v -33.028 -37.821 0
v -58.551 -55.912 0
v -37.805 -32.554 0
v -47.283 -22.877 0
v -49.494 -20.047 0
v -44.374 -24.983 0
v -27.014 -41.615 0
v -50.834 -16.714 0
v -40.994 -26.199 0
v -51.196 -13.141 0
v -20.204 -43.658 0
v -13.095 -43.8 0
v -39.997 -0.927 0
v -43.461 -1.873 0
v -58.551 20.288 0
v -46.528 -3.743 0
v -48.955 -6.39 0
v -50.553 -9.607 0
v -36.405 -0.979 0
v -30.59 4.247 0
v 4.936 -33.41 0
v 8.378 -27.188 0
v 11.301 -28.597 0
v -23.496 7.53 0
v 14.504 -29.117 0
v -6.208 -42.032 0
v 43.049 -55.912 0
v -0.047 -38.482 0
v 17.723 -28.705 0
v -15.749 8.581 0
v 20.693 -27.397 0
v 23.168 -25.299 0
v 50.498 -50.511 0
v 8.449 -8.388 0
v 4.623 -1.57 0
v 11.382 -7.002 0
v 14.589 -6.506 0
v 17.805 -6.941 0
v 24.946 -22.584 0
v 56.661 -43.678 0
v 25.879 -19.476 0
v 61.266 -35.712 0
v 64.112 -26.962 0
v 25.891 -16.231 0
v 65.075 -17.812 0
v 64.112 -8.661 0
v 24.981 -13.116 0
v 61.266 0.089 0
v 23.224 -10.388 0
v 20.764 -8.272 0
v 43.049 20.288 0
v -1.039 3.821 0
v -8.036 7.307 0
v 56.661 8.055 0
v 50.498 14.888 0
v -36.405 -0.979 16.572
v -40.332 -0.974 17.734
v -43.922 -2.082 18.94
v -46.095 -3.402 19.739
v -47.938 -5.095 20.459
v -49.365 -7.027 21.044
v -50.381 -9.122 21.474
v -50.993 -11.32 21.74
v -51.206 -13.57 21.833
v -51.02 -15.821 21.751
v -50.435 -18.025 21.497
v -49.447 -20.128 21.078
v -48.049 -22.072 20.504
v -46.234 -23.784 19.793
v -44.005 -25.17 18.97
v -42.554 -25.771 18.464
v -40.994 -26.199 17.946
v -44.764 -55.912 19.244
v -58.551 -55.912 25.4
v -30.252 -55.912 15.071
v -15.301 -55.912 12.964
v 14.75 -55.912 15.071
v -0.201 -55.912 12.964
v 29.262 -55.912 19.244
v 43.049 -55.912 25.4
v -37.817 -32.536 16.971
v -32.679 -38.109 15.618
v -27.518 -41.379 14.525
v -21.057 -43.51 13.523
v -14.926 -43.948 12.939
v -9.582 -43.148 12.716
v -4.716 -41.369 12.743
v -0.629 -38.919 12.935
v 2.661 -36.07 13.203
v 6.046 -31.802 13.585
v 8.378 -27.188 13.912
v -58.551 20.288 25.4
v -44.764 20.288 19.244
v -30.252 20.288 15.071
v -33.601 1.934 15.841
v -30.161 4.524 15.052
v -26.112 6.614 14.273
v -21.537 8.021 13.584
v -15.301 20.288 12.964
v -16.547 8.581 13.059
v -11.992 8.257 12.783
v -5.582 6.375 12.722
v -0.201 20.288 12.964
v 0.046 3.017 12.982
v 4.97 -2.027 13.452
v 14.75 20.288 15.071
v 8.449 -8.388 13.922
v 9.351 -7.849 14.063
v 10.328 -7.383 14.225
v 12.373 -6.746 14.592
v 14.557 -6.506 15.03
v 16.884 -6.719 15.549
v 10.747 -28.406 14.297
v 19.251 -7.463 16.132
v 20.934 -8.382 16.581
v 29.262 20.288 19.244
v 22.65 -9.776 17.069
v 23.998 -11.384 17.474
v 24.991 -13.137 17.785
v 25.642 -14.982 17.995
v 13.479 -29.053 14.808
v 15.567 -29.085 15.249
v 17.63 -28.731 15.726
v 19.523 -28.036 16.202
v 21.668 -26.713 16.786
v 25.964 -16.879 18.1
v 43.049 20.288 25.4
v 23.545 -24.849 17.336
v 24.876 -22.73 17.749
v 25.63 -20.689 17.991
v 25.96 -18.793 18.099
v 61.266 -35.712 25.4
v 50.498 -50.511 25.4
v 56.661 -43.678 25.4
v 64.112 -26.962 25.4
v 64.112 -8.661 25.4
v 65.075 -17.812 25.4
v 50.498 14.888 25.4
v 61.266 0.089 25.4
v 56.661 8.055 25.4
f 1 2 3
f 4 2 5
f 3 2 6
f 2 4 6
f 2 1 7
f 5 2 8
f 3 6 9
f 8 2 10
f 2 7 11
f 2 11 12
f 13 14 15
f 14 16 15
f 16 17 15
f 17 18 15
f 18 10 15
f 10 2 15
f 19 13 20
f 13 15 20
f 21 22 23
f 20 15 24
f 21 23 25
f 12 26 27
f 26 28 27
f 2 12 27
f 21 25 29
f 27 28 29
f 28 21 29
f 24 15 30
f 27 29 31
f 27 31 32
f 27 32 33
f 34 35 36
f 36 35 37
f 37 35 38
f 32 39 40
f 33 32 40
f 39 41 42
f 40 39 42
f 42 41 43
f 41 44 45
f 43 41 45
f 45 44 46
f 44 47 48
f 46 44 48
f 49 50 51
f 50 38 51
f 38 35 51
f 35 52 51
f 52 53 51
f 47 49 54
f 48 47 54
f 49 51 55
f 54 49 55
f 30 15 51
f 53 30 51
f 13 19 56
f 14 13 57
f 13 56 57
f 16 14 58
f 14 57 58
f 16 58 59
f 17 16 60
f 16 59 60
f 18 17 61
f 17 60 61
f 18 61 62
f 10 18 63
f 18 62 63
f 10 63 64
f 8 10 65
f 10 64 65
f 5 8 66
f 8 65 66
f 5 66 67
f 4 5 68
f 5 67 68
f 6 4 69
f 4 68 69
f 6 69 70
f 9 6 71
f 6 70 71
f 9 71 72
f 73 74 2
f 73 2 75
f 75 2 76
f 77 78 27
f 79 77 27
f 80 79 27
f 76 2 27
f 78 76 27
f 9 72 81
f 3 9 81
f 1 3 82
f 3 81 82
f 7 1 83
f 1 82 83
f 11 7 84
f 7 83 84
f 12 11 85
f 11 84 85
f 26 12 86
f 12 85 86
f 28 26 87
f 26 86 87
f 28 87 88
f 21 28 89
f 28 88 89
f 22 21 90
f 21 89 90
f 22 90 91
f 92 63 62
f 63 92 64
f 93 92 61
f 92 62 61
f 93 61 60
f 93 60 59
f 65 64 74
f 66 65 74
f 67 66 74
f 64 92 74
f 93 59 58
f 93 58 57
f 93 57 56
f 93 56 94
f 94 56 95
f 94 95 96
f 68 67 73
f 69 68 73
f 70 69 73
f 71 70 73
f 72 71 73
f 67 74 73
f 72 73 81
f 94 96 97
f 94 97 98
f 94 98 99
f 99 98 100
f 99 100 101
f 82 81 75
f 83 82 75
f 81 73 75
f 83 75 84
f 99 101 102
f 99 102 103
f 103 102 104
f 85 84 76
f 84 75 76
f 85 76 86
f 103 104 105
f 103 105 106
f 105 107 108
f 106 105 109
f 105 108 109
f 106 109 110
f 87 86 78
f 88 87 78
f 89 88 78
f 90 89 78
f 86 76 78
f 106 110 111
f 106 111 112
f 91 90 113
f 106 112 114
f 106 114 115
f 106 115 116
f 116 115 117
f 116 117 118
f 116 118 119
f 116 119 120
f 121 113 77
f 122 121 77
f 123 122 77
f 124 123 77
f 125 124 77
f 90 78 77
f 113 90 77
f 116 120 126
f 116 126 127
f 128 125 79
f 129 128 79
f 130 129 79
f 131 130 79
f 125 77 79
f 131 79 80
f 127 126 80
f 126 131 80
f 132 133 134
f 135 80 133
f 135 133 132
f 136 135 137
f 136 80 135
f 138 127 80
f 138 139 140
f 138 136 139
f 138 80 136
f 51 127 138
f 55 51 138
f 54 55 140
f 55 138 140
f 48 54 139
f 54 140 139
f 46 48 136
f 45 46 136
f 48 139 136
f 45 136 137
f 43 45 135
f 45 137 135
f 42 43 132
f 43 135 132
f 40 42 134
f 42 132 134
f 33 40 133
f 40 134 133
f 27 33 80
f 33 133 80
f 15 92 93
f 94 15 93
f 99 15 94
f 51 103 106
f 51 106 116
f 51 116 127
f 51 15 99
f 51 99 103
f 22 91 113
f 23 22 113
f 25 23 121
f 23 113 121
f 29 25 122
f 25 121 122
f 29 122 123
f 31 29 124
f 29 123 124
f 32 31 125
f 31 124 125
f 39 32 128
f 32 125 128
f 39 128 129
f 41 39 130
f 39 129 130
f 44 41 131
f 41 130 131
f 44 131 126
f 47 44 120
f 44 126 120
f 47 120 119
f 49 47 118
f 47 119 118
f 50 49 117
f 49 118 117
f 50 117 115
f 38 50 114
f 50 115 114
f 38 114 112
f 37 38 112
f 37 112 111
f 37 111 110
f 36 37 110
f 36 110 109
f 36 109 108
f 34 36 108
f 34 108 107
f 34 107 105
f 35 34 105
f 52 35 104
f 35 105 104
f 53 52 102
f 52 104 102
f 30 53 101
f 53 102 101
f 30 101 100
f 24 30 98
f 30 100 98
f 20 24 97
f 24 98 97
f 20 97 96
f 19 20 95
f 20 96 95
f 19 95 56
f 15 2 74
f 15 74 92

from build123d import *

# Parameters (mm, degrees)
F0_W     = 127
F0_H     = 76.2
F1_DEPTH = 25.4
F3_DEPTH = 25.4
F5_DEPTH = 25.4
F7_DEPTH = 94.22763


# Not quite as in the source:
# - a feature names something its author has since deleted; it is built from what else it names


with BuildPart() as f1:
    # F0 (on Top) → F1 (new body)
    with BuildSketch(Plane.XY):
        with Locations((4.9490761012, -17.8116933908)):
            Rectangle(F0_W, F0_H)
    extrude(amount=F1_DEPTH)

    # F2 (on face) → F3 (cut)
    with BuildSketch(Plane.XY.offset(25.4)):
        with BuildLine():
            Line((43.0490761012, -55.9116933908), (68.4490761012, -55.9116933908))
            Line((68.4490761012, -55.9116933908), (68.4490761012, -17.8116933908))
            Line((68.4490761012, -17.8116933908), (68.4490761012, 20.2883066092))
            Line((68.4490761012, 20.2883066092), (43.0490761012, 20.2883066092))
            ThreePointArc((43.0490761012, 20.2883066092), (65.0746365727, -17.8116933908), (43.0490761012, -55.9116933908))
        make_face()
    extrude(amount=-F3_DEPTH, mode=Mode.SUBTRACT)

    # F4 (on face) → F5 (cut)
    with BuildSketch(Plane.XY.offset(25.4)):
        with BuildLine():
            ThreePointArc((8.3779023105, -27.1882303593), (20.0063433992, -27.7934270204), (26.0023336343, -17.8116933908))
            ThreePointArc((26.0023336343, -17.8116933908), (20.0437900528, -7.8499724051), (8.4485028496, -8.387969882))
            ThreePointArc((8.4485028496, -8.387969882), (9.7226855998, -12.9646479051), (10.1520907288, -17.695941031))
            ThreePointArc((10.1520907288, -17.695941031), (9.7047360462, -22.5242766975), (8.3779023105, -27.1882303593))
        make_face()
        with BuildLine():
            ThreePointArc((10.1520907288, -17.695941031), (9.7226855998, -12.9646479051), (8.4485028496, -8.387969882))
            ThreePointArc((8.4485028496, -8.387969882), (3.3894837429, -17.7692345704), (8.3779023105, -27.1882303593))
            ThreePointArc((8.3779023105, -27.1882303593), (9.7047360462, -22.5242766975), (10.1520907288, -17.695941031))
        make_face()
        with BuildLine():
            ThreePointArc((8.3779023105, -27.1882303593), (3.3894837429, -17.7692345704), (8.4485028496, -8.387969882))
            ThreePointArc((8.4485028496, -8.387969882), (-11.8448406538, 8.2326764046), (-36.4052897795, -0.9787302349))
            ThreePointArc((-36.4052897795, -0.9787302349), (-28.6441463529, -5.3094690784), (-25.5636865376, -13.646219857))
            ThreePointArc((-25.5636865376, -13.646219857), (-30.2938818163, -23.5920338801), (-40.9942057814, -26.1991454999))
            ThreePointArc((-40.9942057814, -26.1991454999), (-16.6542659577, -43.9706572732), (8.3779023105, -27.1882303593))
        make_face()
        with BuildLine():
            ThreePointArc((-40.9942057814, -26.1991454999), (-41.9833758583, -12.9914737388), (-36.4052897795, -0.9787302349))
            ThreePointArc((-36.4052897795, -0.9787302349), (-50.9990660995, -11.3510469345), (-40.9942057814, -26.1991454999))
        make_face()
        with BuildLine():
            ThreePointArc((-25.5636865376, -13.646219857), (-28.6441463529, -5.3094690784), (-36.4052897795, -0.9787302349))
            ThreePointArc((-36.4052897795, -0.9787302349), (-41.9833758583, -12.9914737388), (-40.9942057814, -26.1991454999))
            ThreePointArc((-40.9942057814, -26.1991454999), (-30.2938818163, -23.5920338801), (-25.5636865376, -13.646219857))
        make_face()
    extrude(amount=-F5_DEPTH, mode=Mode.SUBTRACT)

    # F6 (on face) → F7 (cut)
    with BuildSketch(Plane.XZ.offset(55.9116933908)):
        with BuildLine():
            Line((43.0490761012, 25.4), (-58.5509238988, 25.4))
            ThreePointArc((-58.5509238988, 25.4), (-7.7509238988, 12.7), (43.0490761012, 25.4))
        make_face()
    extrude(amount=-F7_DEPTH, mode=Mode.SUBTRACT)


solid = f1.part
